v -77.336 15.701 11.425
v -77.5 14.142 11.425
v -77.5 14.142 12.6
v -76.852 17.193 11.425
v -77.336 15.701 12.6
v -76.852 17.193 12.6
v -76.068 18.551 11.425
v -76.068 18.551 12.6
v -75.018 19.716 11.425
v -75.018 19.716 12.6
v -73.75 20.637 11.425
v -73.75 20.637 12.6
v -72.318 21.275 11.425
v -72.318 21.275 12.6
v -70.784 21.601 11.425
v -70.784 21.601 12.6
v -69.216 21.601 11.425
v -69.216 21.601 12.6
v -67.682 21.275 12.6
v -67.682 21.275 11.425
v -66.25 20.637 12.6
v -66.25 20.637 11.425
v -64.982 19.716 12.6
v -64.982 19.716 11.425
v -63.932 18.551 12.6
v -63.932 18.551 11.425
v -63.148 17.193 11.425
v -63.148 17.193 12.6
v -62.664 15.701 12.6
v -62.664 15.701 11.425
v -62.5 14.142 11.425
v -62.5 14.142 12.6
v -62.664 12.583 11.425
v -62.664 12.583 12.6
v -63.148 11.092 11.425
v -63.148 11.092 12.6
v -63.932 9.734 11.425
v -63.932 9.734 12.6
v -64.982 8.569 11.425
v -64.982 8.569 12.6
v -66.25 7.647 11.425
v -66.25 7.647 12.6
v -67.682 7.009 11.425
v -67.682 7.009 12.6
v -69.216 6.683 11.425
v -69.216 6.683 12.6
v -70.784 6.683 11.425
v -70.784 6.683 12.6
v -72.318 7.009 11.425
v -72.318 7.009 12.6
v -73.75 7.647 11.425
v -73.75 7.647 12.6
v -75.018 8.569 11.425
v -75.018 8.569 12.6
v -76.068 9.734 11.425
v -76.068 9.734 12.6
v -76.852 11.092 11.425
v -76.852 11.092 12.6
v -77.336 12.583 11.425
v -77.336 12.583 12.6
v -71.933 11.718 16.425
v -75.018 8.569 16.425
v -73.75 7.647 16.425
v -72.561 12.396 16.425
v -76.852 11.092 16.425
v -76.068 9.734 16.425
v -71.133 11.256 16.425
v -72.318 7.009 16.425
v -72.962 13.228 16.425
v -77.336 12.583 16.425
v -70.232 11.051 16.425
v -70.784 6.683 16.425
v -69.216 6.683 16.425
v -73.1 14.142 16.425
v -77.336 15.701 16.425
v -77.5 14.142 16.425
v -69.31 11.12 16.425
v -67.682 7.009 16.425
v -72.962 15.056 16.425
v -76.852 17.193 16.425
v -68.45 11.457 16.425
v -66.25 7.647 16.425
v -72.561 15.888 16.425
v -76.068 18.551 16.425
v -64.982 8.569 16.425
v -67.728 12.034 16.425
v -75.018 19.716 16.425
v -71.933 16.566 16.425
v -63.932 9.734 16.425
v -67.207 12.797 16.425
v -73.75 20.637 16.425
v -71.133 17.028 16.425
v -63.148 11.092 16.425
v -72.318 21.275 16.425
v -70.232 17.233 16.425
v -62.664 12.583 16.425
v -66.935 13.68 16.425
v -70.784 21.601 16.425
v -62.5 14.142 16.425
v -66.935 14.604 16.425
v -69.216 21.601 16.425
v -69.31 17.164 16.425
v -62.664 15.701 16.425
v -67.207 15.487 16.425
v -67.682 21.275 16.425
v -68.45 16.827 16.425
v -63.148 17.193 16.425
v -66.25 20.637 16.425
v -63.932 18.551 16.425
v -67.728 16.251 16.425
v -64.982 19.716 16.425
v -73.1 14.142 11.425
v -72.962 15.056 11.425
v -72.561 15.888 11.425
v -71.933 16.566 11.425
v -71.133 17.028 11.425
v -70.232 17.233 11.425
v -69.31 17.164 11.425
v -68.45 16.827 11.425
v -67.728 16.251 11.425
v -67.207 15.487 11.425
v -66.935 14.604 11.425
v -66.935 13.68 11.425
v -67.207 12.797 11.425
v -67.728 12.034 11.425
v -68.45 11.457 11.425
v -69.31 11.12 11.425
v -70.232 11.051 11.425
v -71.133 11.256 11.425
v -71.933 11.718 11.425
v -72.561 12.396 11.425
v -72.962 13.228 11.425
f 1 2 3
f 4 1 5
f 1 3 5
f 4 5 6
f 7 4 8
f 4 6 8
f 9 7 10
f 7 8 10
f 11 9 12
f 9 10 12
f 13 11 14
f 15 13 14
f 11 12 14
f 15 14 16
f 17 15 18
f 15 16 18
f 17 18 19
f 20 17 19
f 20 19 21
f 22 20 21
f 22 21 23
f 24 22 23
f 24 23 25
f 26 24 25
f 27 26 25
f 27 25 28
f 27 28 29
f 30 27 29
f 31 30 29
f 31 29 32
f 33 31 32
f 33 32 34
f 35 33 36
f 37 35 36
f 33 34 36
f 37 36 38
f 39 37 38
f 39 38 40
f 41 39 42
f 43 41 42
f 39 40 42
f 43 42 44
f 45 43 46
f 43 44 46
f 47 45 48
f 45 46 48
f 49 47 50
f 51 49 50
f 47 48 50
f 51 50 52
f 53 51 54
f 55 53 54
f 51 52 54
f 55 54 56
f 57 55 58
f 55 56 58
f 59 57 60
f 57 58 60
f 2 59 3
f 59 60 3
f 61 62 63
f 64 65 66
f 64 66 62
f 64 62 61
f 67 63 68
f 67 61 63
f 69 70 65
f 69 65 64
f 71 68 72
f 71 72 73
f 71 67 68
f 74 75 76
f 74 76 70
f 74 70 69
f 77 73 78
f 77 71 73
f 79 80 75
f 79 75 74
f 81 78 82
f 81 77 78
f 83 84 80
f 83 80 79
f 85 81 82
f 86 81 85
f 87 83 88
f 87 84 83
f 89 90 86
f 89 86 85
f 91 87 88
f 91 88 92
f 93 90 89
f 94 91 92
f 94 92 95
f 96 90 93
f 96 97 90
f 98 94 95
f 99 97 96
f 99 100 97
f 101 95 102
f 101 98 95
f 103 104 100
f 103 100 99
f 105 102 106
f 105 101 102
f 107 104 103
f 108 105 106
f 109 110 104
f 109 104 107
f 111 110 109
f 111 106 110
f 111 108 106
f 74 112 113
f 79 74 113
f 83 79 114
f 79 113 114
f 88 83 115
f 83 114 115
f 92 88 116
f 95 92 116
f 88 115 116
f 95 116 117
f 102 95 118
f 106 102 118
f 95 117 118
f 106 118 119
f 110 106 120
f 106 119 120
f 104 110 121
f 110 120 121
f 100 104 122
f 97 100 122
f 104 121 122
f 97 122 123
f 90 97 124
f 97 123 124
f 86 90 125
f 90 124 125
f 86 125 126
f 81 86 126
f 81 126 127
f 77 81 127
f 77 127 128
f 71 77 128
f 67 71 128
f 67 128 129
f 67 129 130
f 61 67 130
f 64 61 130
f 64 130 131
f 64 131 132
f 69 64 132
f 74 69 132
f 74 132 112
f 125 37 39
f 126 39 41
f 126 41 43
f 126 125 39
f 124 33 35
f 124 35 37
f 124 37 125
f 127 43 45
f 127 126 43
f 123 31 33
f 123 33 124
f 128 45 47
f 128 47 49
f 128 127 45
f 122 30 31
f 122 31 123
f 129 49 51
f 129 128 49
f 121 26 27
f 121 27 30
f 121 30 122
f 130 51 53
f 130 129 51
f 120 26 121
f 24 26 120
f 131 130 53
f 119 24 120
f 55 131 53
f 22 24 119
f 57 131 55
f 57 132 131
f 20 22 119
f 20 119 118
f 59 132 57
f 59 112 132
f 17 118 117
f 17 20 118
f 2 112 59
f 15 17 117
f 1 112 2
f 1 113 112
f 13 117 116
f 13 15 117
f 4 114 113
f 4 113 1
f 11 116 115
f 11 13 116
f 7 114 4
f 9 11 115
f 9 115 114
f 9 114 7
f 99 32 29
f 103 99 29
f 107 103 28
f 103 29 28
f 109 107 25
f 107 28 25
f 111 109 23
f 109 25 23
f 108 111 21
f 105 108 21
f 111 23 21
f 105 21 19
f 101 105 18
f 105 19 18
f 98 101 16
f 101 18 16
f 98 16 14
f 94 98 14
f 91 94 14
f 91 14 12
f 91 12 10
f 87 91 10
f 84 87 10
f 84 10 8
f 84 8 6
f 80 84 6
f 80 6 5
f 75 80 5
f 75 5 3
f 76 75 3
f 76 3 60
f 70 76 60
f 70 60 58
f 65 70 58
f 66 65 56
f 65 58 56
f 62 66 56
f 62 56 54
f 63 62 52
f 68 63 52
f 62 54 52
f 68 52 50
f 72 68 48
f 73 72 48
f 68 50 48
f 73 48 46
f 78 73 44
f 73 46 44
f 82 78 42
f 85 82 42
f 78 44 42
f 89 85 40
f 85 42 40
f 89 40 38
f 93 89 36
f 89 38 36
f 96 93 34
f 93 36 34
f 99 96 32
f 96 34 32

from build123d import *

# Parameters (mm, degrees)
SKETCH1_R           = 7.5
SKETCH1_R_2         = 3
BOSS_EXTRUDE1_DEPTH = 3.82499
SKETCH2_R           = 7.5
SKETCH2_R_2         = 3
BOSS_EXTRUDE2_DEPTH = 1.17501
CUT_EXTRUDE1_REACH  = 7
SKETCH3_R           = 3.1


with BuildPart() as part:
    # Sketch1 → Boss-Extrude1 (new body)
    with BuildSketch(Plane.XY.offset(12.6)):
        with Locations((-69.999984325, 14.142135624)):
            Circle(SKETCH1_R)
        with Locations((-69.999984325, 14.142135624)):
            Circle(SKETCH1_R_2, mode=Mode.SUBTRACT)
    extrude(amount=BOSS_EXTRUDE1_DEPTH)

    # Sketch2 → Boss-Extrude2 (add)
    with BuildSketch(Plane(origin=(0, 0, 12.6), x_dir=(-1, 0, 0), z_dir=(0, 0, -1))):
        with Locations((69.999984325, 14.142135624)):
            Circle(SKETCH2_R)
        with Locations((69.999984325, 14.142135624)):
            Circle(SKETCH2_R_2, mode=Mode.SUBTRACT)
    extrude(amount=BOSS_EXTRUDE2_DEPTH)

    # Sketch3 → Cut-Extrude1 (cut, up to next)
    with BuildSketch(Plane(origin=(0, 0, 11.424990227), x_dir=(-1, 0, 0), z_dir=(0, 0, -1)), mode=Mode.PRIVATE) as cut_extrude1_sk1:
        with Locations((69.999984325, 14.142135624)):
            Circle(SKETCH3_R)
    cut_extrude1_tool1 = extrude(cut_extrude1_sk1.sketch, amount=-CUT_EXTRUDE1_REACH, mode=Mode.PRIVATE) & part.part
    add(cut_extrude1_tool1.solids().sort_by_distance((-69.999984, 14.142136, 11.42499))[0], mode=Mode.SUBTRACT)


solid = part.part
